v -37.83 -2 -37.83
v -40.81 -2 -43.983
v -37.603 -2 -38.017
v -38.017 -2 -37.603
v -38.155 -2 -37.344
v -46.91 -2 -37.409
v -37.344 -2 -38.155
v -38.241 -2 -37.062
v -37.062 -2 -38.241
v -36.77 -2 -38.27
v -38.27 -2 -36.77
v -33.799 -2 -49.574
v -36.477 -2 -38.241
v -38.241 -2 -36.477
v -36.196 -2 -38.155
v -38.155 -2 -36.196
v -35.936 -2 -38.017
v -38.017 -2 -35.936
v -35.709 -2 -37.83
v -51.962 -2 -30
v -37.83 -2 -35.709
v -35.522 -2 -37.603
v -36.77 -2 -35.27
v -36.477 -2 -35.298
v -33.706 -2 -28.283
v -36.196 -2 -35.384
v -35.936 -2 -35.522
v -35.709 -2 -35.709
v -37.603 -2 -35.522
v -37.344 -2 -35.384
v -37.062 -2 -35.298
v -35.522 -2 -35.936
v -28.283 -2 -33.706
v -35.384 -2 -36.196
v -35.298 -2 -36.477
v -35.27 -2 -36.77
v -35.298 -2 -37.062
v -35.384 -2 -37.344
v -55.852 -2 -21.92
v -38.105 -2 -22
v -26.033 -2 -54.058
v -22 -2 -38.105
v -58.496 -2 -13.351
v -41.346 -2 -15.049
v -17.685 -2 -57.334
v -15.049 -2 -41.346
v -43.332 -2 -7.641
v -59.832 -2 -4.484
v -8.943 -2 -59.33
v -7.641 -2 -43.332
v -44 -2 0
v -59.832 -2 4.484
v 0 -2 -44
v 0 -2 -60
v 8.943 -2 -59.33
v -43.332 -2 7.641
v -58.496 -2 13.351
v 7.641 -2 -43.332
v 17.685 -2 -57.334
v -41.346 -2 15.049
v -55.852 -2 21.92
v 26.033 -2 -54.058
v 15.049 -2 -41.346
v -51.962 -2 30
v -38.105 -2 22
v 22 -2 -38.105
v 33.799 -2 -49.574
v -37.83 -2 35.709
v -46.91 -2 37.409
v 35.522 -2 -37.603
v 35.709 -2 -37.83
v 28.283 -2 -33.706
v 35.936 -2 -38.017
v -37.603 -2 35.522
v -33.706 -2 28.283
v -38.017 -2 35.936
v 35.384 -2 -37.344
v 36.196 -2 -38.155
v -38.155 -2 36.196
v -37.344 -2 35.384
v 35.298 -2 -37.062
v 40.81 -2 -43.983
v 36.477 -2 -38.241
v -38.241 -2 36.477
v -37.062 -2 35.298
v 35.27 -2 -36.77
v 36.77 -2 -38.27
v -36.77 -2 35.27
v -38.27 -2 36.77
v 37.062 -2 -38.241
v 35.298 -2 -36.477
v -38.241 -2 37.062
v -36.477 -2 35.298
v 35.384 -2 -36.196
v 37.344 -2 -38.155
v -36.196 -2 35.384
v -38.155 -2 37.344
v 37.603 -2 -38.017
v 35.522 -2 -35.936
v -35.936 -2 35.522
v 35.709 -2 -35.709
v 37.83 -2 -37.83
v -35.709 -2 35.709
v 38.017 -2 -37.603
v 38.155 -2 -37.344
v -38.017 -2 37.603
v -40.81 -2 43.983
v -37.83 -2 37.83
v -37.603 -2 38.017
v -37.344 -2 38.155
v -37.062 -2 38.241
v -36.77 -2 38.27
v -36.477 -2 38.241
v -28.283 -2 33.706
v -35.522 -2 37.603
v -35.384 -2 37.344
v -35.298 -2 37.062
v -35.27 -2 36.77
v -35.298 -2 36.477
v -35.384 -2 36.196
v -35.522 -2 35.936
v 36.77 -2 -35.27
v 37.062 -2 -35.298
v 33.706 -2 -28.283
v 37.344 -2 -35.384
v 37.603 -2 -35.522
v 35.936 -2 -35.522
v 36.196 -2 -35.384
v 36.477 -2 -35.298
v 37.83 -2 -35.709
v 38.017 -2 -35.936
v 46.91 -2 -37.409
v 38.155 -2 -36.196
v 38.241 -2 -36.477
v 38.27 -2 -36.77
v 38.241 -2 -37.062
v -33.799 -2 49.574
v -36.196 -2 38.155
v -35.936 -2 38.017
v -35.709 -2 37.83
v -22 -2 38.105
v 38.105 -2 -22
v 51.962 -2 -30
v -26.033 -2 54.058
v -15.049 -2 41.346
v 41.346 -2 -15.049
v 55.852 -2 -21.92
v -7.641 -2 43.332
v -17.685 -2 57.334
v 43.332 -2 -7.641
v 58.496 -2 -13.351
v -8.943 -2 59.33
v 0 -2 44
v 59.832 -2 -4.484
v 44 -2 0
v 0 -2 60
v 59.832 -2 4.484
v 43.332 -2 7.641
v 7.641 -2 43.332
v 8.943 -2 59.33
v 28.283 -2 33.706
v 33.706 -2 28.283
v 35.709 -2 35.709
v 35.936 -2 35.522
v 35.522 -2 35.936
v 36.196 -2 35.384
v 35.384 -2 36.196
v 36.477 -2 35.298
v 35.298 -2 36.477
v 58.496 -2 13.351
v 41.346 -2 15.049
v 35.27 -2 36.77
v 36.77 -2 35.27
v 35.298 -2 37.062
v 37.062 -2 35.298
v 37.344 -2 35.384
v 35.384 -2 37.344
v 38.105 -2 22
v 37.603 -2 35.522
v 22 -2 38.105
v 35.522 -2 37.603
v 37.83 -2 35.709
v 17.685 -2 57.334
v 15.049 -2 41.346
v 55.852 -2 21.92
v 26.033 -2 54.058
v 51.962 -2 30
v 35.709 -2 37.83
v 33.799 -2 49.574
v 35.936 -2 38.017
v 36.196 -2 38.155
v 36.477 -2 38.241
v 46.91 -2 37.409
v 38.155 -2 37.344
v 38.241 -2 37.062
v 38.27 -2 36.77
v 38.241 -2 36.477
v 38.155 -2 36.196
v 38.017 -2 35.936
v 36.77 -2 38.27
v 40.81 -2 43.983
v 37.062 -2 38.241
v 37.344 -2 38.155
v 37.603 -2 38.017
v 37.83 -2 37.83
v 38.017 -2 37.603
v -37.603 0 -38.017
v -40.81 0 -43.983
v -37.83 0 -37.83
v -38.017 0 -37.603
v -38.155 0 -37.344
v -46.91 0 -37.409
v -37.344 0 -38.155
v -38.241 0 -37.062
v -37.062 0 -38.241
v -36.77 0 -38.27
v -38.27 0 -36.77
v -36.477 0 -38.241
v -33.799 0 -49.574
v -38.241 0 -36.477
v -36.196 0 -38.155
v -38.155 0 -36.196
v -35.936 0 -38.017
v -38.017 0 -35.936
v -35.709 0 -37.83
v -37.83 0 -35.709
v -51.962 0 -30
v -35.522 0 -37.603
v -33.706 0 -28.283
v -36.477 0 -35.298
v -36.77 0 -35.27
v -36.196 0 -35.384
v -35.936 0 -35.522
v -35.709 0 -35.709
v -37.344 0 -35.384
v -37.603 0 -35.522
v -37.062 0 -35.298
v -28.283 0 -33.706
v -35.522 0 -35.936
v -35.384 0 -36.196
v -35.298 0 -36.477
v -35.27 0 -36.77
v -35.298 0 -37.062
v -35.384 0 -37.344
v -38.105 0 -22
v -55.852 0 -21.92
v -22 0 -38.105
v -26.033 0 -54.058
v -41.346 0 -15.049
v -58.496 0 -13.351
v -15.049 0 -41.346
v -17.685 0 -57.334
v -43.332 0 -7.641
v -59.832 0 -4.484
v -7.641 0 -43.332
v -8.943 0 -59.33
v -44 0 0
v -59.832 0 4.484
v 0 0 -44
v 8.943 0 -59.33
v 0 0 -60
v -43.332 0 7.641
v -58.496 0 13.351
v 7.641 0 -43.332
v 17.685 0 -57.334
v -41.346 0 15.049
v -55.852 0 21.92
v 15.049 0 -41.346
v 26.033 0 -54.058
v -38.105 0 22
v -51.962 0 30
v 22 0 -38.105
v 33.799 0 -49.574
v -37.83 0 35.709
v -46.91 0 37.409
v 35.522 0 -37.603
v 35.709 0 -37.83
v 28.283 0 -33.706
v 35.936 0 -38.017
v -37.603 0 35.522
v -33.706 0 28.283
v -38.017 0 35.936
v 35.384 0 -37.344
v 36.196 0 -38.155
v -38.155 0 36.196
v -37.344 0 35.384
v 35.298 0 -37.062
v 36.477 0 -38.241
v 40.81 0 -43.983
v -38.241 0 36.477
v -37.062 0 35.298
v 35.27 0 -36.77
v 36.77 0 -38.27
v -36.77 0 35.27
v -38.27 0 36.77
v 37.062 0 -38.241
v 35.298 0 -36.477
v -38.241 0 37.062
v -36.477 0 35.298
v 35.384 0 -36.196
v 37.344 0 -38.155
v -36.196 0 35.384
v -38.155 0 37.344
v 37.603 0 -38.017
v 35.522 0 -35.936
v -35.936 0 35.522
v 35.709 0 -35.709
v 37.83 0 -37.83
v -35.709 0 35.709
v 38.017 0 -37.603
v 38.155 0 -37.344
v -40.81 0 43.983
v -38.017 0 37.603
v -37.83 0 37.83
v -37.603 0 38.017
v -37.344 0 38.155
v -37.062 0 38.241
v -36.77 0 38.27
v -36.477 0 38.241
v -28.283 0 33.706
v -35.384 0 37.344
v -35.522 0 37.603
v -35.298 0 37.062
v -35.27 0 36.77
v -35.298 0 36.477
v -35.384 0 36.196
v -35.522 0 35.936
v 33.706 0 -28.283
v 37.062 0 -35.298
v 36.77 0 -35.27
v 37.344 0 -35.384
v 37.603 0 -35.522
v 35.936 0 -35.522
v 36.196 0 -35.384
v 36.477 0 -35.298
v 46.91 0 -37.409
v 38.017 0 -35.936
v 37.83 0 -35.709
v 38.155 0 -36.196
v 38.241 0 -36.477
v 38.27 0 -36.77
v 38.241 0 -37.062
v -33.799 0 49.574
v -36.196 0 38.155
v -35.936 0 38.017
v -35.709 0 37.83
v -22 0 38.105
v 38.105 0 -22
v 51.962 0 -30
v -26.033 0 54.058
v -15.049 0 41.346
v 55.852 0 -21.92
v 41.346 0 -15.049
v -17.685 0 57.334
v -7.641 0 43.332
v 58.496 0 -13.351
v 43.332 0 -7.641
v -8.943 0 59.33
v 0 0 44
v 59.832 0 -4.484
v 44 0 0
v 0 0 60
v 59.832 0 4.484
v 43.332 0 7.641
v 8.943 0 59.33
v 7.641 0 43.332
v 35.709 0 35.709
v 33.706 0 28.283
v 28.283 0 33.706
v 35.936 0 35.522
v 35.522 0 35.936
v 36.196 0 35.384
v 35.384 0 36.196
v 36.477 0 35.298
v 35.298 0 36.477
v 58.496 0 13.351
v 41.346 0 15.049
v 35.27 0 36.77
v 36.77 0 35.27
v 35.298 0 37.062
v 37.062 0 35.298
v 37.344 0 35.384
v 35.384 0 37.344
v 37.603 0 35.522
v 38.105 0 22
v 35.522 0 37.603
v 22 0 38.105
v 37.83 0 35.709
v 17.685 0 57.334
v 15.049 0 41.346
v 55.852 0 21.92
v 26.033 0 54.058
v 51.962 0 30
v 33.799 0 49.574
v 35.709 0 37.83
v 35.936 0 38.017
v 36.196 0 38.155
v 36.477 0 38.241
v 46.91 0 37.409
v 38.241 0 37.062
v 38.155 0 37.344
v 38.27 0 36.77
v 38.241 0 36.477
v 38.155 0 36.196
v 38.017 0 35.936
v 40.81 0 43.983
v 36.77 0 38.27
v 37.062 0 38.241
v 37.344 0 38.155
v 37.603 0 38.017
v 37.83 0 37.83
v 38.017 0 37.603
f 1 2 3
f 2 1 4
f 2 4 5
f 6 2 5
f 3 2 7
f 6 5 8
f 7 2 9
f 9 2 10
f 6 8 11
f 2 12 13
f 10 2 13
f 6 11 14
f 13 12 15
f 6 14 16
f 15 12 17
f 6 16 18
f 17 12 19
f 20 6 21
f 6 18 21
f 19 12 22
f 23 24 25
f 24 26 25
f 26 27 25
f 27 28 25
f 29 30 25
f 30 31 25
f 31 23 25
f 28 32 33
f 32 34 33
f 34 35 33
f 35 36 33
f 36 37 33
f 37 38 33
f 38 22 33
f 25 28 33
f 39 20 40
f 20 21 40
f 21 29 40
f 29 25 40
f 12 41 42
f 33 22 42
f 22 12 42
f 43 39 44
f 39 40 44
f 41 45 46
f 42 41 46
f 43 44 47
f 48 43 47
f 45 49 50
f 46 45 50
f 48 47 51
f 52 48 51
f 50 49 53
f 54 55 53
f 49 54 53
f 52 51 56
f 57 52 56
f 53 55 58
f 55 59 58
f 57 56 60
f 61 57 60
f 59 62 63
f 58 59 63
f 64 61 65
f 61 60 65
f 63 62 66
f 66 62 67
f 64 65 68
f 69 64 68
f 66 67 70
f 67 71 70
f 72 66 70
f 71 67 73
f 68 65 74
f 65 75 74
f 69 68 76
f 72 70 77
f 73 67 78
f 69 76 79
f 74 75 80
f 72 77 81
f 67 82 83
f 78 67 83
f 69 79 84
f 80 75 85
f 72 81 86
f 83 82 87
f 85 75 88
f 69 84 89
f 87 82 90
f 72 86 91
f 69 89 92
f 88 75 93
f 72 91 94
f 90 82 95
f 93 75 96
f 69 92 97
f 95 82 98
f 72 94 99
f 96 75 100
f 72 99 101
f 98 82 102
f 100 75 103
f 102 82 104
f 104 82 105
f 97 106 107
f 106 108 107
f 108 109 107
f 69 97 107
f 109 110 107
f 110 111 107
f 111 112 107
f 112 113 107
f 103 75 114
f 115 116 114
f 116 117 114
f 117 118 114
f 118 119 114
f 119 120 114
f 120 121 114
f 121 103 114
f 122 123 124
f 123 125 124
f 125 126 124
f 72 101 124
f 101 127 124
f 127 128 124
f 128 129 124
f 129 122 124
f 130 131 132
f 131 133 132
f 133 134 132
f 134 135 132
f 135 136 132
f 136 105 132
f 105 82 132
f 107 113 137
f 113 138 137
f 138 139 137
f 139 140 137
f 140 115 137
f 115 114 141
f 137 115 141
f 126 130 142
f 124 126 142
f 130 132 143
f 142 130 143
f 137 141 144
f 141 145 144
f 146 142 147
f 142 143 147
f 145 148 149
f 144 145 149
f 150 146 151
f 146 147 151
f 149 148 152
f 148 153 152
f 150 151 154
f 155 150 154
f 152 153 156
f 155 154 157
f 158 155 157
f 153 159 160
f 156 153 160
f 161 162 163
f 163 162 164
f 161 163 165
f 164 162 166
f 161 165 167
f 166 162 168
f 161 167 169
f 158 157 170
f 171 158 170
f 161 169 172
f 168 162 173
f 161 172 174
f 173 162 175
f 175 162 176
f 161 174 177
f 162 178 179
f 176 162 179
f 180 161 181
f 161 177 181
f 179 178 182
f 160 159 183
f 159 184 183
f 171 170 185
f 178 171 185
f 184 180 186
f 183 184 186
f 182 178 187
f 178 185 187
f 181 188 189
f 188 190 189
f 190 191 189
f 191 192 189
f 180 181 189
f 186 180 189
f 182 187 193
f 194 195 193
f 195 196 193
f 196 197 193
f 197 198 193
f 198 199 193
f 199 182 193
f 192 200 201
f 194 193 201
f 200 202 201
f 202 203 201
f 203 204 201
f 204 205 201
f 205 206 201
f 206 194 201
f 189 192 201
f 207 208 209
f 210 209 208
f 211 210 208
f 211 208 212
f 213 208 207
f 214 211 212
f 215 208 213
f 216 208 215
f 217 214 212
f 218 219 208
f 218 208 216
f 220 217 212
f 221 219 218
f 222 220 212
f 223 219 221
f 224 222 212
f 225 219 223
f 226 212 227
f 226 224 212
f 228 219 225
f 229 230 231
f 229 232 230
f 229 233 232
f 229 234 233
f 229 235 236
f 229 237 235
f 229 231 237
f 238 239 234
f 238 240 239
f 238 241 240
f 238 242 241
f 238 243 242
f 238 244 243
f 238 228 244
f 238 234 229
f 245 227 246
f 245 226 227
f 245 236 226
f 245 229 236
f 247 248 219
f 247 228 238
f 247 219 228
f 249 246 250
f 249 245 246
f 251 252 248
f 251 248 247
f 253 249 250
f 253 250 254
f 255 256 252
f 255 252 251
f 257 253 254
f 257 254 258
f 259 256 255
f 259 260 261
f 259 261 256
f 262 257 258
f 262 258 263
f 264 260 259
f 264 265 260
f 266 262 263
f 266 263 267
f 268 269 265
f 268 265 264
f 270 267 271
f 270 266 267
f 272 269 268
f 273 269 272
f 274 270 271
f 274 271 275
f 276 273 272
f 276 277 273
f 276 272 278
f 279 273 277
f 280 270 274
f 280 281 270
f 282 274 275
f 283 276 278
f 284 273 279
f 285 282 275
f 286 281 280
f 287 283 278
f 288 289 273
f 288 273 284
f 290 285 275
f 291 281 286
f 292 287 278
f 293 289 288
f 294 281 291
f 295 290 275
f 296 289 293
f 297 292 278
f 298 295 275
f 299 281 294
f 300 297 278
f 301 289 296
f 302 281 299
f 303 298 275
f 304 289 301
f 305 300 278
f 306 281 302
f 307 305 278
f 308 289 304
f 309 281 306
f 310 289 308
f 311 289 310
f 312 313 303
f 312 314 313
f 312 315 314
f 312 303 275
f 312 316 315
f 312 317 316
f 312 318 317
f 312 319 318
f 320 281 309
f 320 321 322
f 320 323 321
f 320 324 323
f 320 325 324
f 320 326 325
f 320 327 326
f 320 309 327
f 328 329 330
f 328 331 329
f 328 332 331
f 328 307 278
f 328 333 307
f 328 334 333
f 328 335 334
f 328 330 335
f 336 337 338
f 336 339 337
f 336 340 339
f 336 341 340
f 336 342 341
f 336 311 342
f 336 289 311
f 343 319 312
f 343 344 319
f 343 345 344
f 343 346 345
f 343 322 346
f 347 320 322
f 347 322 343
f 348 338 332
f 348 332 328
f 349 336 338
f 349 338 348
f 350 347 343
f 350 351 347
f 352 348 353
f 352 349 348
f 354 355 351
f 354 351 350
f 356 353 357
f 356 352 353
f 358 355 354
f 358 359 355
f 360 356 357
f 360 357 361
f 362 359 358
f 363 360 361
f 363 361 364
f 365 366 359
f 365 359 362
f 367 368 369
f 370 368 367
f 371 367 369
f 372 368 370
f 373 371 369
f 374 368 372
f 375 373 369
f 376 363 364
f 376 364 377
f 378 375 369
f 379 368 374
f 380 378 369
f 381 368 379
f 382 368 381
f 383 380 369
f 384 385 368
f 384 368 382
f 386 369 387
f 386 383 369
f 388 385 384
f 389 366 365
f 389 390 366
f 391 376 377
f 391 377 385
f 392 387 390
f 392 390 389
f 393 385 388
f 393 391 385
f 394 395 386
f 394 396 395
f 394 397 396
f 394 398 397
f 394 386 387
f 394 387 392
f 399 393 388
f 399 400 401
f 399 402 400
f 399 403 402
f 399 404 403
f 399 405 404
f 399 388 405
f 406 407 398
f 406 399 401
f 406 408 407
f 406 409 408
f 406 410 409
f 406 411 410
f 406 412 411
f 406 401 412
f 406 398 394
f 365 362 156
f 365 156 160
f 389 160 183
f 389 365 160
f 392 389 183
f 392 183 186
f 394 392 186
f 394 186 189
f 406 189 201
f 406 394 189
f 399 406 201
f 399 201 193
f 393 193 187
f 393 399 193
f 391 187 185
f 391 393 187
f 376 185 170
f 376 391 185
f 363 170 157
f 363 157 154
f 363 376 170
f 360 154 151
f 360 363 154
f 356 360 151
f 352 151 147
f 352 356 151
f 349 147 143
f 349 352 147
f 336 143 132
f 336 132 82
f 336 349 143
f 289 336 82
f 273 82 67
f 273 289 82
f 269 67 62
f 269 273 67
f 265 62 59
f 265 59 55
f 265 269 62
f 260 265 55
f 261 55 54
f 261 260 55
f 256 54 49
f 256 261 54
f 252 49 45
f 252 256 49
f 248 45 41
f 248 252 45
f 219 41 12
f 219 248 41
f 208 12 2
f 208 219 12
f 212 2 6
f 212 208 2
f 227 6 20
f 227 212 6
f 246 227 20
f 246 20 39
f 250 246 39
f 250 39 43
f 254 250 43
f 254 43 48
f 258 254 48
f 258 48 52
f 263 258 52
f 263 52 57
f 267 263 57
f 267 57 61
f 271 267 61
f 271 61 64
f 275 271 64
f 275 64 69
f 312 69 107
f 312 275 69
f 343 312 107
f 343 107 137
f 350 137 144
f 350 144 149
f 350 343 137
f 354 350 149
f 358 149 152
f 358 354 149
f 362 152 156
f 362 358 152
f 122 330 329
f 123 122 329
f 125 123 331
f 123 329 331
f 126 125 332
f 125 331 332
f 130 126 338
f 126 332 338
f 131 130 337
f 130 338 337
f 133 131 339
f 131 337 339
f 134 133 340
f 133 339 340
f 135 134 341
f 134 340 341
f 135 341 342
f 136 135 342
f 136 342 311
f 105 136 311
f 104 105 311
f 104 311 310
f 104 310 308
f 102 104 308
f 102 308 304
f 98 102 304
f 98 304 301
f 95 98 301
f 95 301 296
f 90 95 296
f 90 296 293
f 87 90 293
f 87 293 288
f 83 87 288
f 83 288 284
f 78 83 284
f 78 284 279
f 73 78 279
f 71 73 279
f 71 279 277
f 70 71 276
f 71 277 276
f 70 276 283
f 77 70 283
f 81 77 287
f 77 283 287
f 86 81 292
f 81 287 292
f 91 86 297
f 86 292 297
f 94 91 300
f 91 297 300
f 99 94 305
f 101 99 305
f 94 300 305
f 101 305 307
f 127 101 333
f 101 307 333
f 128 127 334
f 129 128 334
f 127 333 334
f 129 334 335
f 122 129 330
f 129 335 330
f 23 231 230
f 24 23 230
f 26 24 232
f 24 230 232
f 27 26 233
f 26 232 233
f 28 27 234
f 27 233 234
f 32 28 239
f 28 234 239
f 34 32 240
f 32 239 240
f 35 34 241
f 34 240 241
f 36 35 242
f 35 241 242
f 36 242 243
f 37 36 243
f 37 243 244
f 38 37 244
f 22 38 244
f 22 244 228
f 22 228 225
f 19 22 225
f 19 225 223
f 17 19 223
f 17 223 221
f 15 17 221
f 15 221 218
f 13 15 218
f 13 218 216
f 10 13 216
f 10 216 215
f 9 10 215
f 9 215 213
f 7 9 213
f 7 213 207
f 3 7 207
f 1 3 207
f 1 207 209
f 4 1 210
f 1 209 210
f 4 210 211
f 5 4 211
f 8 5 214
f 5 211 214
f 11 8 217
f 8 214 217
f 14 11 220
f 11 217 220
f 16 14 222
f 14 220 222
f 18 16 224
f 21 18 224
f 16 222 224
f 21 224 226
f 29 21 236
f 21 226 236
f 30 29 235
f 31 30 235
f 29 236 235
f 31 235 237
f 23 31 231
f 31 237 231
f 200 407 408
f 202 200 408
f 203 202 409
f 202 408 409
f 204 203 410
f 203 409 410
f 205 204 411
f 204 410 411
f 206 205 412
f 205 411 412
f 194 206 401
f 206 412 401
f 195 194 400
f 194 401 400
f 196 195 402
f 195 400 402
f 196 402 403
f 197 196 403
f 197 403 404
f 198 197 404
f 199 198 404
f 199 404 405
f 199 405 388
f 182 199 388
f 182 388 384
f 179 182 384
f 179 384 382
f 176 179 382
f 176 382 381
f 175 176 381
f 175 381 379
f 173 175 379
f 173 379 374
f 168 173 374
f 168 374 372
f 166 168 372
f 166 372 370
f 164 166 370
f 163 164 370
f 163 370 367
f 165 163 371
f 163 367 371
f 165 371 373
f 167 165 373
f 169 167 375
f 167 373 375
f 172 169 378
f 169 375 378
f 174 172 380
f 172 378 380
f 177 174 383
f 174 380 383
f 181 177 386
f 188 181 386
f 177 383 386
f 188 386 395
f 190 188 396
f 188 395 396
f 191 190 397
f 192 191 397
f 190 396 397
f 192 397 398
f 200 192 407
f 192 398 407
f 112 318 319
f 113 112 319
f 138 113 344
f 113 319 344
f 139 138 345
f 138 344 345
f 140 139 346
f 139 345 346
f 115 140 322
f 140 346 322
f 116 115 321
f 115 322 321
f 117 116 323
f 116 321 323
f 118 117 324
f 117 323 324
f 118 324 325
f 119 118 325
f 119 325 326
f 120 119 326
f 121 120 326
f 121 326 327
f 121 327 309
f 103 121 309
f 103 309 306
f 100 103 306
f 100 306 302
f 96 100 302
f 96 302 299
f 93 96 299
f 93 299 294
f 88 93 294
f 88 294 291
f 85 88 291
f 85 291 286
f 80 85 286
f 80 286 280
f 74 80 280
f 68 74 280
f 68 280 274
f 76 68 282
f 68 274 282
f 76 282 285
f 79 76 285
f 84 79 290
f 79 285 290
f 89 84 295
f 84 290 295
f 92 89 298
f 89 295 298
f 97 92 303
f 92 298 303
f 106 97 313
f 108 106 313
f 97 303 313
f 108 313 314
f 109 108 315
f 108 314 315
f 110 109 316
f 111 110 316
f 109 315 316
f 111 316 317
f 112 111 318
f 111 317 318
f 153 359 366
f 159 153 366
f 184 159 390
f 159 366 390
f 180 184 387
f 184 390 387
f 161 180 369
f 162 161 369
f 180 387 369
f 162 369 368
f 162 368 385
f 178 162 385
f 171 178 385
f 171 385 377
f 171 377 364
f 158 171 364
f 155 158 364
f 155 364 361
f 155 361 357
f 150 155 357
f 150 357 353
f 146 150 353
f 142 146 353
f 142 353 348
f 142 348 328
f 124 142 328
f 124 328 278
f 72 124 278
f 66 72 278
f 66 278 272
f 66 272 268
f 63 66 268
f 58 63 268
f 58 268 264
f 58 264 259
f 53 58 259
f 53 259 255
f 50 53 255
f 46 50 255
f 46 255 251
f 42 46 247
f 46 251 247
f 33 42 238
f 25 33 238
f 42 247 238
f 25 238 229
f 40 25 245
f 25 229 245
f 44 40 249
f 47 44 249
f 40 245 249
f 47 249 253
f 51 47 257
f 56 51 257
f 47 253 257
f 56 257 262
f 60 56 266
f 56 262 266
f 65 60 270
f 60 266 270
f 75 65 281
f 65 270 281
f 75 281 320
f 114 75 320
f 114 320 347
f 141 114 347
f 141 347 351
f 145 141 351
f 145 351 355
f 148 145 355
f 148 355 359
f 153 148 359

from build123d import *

# Parameters (mm, degrees)
SKETCH_1_R             = 60
SM_BASE_FLANGE_1_DEPTH = 2
CUT_EXTRUDE_2_REACH    = 86.876
SKETCH_7_R             = 44
CUT_EXTRUDE_1_REACH    = 86.876
SKETCH_6_R             = 1.5


# Sheet-metal steps are written as plain solids
with BuildPart() as part:
    # Sketch 1 → 基体-法兰1 (new body)
    with BuildSketch(Plane(origin=(0, 0, 0), x_dir=(1, 0, 0), z_dir=(0, 1, 0))):
        with Locations(Location((0, 0, 0), (0, 0, 270))):
            Circle(SKETCH_1_R)
    extrude(amount=-SM_BASE_FLANGE_1_DEPTH)

    # 草图7 → 切除-拉伸2 (cut, up to next)
    with BuildSketch(Plane(origin=(0, 0, 0), x_dir=(1, 0, 0), z_dir=(0, 1, 0)), mode=Mode.PRIVATE) as cut_extrude_2_sk1:
        with Locations(Location((0, 0, 0), (0, 0, 270))):
            Circle(SKETCH_7_R)
    cut_extrude_2_tool1 = extrude(cut_extrude_2_sk1.sketch, amount=-CUT_EXTRUDE_2_REACH, mode=Mode.PRIVATE) & part.part
    add(cut_extrude_2_tool1.solids().sort_by_distance((0, 0, 0))[0], mode=Mode.SUBTRACT)

    # 草图6 → 切除-拉伸1 (cut, up to next)
    with BuildSketch(Plane(origin=(0, 0, 0), x_dir=(1, 0, 0), z_dir=(0, 1, 0)), mode=Mode.PRIVATE) as cut_extrude_1_sk1:
        with Locations(Location((-36.769552622, -36.769552622, 0), (0, 0, 270))):
            Circle(SKETCH_6_R)
    cut_extrude_1_tool1 = extrude(cut_extrude_1_sk1.sketch, amount=-CUT_EXTRUDE_1_REACH, mode=Mode.PRIVATE) & part.part
    # 草图6 → 切除-拉伸1 (cut, up to next)
    with BuildSketch(Plane(origin=(0, 0, 0), x_dir=(1, 0, 0), z_dir=(0, 1, 0)), mode=Mode.PRIVATE) as cut_extrude_1_sk2:
        with Locations(Location((-36.769552622, 36.769552622, 0), (0, 0, 270))):
            Circle(SKETCH_6_R)
    cut_extrude_1_tool2 = extrude(cut_extrude_1_sk2.sketch, amount=-CUT_EXTRUDE_1_REACH, mode=Mode.PRIVATE) & part.part
    # 草图6 → 切除-拉伸1 (cut, up to next)
    with BuildSketch(Plane(origin=(0, 0, 0), x_dir=(1, 0, 0), z_dir=(0, 1, 0)), mode=Mode.PRIVATE) as cut_extrude_1_sk3:
        with Locations(Location((36.769552622, 36.769552622, 0), (0, 0, 270))):
            Circle(SKETCH_6_R)
    cut_extrude_1_tool3 = extrude(cut_extrude_1_sk3.sketch, amount=-CUT_EXTRUDE_1_REACH, mode=Mode.PRIVATE) & part.part
    # 草图6 → 切除-拉伸1 (cut, up to next)
    with BuildSketch(Plane(origin=(0, 0, 0), x_dir=(1, 0, 0), z_dir=(0, 1, 0)), mode=Mode.PRIVATE) as cut_extrude_1_sk4:
        with Locations(Location((36.769552622, -36.769552622, 0), (0, 0, 270))):
            Circle(SKETCH_6_R)
    cut_extrude_1_tool4 = extrude(cut_extrude_1_sk4.sketch, amount=-CUT_EXTRUDE_1_REACH, mode=Mode.PRIVATE) & part.part
    add(cut_extrude_1_tool1.solids().sort_by_distance((-36.769553, 0, 36.769553))[0], mode=Mode.SUBTRACT)
    add(cut_extrude_1_tool2.solids().sort_by_distance((-36.769553, 0, -36.769553))[0], mode=Mode.SUBTRACT)
    add(cut_extrude_1_tool3.solids().sort_by_distance((36.769553, 0, -36.769553))[0], mode=Mode.SUBTRACT)
    add(cut_extrude_1_tool4.solids().sort_by_distance((36.769553, 0, 36.769553))[0], mode=Mode.SUBTRACT)


solid = part.part
